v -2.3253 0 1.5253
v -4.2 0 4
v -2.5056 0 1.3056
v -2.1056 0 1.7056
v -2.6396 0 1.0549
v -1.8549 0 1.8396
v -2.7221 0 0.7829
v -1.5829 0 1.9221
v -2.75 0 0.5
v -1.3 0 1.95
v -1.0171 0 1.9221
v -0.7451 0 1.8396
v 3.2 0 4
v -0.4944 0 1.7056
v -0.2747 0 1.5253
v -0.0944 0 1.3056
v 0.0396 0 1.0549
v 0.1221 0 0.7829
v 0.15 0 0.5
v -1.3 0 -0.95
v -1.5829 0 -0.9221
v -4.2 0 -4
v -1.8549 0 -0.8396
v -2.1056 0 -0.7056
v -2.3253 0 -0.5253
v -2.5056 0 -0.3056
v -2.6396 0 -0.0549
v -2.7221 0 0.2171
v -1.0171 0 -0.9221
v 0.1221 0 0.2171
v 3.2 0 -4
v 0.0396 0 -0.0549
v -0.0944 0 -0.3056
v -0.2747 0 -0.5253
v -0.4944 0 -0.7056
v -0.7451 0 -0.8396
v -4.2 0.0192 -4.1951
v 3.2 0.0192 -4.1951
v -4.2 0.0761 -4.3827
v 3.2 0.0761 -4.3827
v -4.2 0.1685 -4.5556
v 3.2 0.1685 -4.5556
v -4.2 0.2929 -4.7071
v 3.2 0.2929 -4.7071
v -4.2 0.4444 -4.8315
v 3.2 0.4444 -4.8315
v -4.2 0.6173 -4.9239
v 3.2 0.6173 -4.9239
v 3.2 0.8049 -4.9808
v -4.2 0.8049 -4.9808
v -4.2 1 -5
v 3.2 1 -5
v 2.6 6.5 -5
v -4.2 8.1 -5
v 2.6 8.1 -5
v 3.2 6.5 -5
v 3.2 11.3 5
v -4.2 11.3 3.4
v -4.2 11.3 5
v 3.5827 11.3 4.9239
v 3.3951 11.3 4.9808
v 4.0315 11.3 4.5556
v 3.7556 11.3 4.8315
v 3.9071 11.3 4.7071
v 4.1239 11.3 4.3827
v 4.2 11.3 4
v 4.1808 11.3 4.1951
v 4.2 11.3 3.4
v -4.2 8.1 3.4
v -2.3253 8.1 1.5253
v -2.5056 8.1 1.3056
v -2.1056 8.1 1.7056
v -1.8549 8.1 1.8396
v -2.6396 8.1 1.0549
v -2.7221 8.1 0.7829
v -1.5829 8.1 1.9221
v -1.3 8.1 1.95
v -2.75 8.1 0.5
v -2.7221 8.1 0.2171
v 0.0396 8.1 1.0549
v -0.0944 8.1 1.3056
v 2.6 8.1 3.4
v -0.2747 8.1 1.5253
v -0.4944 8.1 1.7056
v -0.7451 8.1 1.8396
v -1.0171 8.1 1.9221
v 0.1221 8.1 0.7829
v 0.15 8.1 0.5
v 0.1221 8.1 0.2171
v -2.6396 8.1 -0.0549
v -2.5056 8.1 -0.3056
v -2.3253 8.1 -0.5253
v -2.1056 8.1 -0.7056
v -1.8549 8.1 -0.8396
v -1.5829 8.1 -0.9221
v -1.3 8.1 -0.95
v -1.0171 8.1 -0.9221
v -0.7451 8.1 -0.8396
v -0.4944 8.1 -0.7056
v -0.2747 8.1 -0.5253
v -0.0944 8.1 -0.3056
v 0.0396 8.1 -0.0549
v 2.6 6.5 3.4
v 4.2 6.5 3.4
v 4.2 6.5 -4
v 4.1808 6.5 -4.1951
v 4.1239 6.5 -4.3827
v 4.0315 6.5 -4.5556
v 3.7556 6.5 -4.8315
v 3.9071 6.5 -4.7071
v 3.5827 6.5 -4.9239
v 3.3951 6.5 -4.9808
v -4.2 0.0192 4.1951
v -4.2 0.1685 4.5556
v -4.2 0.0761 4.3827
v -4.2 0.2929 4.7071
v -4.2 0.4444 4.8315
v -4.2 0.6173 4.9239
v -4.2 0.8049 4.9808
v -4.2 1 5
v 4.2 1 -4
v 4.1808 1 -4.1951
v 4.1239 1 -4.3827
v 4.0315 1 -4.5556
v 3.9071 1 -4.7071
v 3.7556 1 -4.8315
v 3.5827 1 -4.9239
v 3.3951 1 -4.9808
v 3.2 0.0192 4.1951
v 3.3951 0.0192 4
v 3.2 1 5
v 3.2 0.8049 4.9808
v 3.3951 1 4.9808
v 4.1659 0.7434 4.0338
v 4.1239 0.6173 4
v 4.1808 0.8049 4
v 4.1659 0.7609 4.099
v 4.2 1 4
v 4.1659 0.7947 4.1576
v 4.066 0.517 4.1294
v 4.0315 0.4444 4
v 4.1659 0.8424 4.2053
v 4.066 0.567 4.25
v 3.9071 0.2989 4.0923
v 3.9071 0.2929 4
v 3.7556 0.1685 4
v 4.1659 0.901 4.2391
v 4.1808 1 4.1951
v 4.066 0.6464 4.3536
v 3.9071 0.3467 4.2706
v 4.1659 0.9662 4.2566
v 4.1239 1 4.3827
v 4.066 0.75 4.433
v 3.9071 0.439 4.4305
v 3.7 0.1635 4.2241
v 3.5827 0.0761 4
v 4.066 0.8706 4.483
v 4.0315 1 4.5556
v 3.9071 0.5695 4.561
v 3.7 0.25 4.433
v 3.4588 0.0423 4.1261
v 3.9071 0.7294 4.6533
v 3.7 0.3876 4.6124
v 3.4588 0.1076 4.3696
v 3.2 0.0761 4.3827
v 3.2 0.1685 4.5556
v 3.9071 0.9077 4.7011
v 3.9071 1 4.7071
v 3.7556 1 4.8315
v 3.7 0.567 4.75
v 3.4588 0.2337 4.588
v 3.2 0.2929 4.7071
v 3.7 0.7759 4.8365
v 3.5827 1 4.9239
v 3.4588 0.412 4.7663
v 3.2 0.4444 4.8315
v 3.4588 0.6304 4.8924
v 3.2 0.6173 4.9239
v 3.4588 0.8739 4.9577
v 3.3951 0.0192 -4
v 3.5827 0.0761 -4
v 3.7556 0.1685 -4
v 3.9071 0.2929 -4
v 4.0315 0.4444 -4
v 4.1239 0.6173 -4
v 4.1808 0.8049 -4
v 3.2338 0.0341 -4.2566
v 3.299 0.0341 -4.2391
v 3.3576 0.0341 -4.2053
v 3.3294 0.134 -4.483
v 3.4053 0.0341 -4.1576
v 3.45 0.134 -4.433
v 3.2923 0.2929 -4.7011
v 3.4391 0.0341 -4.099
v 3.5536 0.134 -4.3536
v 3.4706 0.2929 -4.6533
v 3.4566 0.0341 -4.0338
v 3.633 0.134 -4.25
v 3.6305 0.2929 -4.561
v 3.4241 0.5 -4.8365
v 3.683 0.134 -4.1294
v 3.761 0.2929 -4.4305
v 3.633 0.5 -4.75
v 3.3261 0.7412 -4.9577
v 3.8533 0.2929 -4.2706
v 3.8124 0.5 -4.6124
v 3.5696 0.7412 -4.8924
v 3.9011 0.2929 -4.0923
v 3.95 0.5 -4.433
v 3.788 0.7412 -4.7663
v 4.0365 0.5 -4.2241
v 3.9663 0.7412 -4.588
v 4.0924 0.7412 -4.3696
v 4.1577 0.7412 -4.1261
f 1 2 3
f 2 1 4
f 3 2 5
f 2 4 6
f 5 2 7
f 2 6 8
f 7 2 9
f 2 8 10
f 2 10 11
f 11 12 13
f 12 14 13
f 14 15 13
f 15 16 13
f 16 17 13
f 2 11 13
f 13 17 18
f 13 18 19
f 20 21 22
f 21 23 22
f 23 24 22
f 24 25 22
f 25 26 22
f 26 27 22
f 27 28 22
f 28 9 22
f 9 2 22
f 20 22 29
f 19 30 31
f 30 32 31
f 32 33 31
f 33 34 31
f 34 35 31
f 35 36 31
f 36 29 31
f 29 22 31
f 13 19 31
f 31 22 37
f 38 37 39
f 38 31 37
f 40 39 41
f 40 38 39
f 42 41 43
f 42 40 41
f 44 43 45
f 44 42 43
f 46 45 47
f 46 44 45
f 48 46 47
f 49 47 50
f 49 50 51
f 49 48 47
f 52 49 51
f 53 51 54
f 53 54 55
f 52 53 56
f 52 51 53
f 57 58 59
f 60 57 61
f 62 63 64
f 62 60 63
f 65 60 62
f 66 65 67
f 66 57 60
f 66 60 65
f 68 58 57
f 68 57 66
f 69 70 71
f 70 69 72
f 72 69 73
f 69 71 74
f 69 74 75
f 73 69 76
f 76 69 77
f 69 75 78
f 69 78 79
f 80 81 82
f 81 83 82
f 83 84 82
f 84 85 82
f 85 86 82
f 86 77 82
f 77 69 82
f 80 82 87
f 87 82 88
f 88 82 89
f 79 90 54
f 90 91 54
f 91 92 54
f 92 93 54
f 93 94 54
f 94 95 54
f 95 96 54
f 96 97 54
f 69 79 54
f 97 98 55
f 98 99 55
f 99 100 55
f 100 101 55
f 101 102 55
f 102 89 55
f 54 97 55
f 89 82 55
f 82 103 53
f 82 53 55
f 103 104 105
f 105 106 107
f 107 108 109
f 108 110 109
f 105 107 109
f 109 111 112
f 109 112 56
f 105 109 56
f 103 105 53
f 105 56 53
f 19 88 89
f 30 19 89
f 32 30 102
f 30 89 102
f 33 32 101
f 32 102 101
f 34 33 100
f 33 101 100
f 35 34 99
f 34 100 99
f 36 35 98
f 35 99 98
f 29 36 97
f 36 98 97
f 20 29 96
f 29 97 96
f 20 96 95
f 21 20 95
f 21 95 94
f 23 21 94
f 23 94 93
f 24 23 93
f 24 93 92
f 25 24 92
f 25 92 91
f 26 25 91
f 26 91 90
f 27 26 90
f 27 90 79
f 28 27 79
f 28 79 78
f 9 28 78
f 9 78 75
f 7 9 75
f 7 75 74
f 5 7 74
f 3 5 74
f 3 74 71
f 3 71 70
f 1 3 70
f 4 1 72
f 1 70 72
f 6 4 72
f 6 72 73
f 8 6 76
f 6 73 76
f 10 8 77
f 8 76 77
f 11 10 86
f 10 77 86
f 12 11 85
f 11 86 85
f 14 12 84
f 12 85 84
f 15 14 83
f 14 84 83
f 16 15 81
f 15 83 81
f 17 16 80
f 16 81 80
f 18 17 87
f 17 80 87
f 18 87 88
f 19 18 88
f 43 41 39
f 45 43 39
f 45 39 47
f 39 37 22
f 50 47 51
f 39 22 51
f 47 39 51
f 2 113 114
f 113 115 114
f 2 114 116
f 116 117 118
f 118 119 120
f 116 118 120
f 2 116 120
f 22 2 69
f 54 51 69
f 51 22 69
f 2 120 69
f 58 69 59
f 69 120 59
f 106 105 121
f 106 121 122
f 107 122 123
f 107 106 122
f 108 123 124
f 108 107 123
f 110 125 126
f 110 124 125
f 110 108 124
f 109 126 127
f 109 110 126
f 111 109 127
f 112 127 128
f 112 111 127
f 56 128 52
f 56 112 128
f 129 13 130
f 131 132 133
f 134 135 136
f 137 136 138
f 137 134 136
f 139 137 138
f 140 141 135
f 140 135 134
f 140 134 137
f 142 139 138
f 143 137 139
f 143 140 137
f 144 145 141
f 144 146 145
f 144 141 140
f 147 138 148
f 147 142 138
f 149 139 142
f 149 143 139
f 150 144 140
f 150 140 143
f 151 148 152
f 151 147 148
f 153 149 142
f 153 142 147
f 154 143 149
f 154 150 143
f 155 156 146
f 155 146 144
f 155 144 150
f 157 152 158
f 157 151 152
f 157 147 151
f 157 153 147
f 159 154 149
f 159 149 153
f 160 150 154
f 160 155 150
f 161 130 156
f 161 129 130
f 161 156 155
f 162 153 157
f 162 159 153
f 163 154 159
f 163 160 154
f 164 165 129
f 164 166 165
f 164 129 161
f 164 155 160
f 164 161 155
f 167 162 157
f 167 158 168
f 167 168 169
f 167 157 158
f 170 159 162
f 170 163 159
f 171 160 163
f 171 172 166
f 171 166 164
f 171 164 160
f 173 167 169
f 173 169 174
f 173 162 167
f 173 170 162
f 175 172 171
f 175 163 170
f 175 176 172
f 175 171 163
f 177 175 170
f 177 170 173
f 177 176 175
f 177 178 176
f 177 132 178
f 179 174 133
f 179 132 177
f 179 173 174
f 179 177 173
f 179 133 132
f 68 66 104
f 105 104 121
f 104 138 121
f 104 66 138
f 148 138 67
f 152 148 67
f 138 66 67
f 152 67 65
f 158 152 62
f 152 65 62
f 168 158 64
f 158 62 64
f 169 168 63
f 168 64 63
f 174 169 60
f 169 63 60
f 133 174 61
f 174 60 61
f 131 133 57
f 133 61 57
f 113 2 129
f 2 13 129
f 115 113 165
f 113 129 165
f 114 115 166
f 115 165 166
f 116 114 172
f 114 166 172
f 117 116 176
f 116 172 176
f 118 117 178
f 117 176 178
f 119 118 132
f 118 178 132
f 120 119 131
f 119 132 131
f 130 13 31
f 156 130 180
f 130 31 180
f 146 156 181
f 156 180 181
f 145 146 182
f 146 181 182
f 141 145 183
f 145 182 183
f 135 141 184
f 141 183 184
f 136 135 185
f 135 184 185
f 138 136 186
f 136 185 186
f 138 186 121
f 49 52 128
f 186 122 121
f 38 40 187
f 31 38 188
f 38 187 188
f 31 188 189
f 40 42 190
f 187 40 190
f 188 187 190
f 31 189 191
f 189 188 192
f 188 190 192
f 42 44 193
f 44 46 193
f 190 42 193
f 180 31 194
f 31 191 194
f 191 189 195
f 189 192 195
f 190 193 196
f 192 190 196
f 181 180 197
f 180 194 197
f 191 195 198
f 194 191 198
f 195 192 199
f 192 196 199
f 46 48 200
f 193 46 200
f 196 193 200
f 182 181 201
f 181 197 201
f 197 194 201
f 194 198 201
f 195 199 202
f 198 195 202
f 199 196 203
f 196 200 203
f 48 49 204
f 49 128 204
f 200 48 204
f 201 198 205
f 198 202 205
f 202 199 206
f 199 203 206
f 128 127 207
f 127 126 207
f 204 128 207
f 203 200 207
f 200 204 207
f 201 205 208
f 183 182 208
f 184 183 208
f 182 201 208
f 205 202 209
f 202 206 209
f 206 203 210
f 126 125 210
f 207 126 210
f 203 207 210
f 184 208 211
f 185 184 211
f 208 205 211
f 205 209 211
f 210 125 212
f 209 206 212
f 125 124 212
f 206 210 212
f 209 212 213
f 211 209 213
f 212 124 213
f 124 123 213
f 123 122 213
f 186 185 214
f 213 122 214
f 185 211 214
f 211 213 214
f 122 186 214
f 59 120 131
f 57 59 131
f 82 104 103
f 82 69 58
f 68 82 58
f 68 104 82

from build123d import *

# Parameters (mm, degrees)
SKETCH2_W               = 8.4
SKETCH2_H               = 10
BOSS_EXTRUDE1_DEPTH     = 11.3
SKETCH5_W               = 8.4
SKETCH5_H               = 1.5
CUT_EXTRUDE2_DEPTH      = 11.3
SKETCH7_W               = 1.6
SKETCH7_H               = 3.3
CUT_EXTRUDE4_DEPTH      = 8.4
SKETCH9_W               = 8.4
SKETCH9_H               = 1.7
CUT_EXTRUDE5_DEPTH      = 6.8
SKETCH12_W              = 6.8
SKETCH12_H              = 1.6
BOSS_EXTRUDE3_DEPTH     = 1.6
FILLET1_R               = 1
M3_5X0_6_TAPPED_HOLE1_D = 2.9
SKETCH20_W              = 1.6
SKETCH20_H              = 1.6
CUT_EXTRUDE6_DEPTH      = 6.8


with BuildPart() as part:
    # Sketch2 → Boss-Extrude1 (new body)
    with BuildSketch(Plane(origin=(0, 0, 0), x_dir=(1, 0, 0), z_dir=(0, 1, 0))):
        Rectangle(SKETCH2_W, SKETCH2_H)
    extrude(amount=BOSS_EXTRUDE1_DEPTH)

    # Sketch5 → Cut-Extrude2 (cut)
    with BuildSketch(Plane(origin=(4.2, 0, 0), x_dir=(0, 0, -1), z_dir=(1, 0, 0))):
        with Locations((0.8, 10.55)):
            Rectangle(SKETCH5_W, SKETCH5_H)
    extrude(amount=-CUT_EXTRUDE2_DEPTH, mode=Mode.SUBTRACT)

    # Sketch7 → Cut-Extrude4 (cut)
    with BuildSketch(Plane(origin=(0, 0, -5), x_dir=(-1, 0, 0), z_dir=(0, 0, -1))):
        with Locations((-3.4, 8.15)):
            Rectangle(SKETCH7_W, SKETCH7_H)
    extrude(amount=-CUT_EXTRUDE4_DEPTH, mode=Mode.SUBTRACT)

    # Sketch9 → Cut-Extrude5 (cut)
    with BuildSketch(Plane(origin=(2.6, 0, 0), x_dir=(0, 0, -1), z_dir=(1, 0, 0))):
        with Locations((0.8, 8.95)):
            Rectangle(SKETCH9_W, SKETCH9_H)
    extrude(amount=-CUT_EXTRUDE5_DEPTH, mode=Mode.SUBTRACT)

    # Sketch12 → Boss-Extrude3 (add)
    with BuildSketch(Plane(origin=(0, 0, 3.4), x_dir=(-1, 0, 0), z_dir=(0, 0, -1))):
        with Locations((0.8, 8.9)):
            Rectangle(SKETCH12_W, SKETCH12_H)
    extrude(amount=BOSS_EXTRUDE3_DEPTH)

    # Fillet1
    fillet1_edges = [part.edges().sort_by_distance(p)[0] for p in [
        (4.2, 3.25, -5),
        (0, 0, 5),
        (0, 0, -5),
        (4.2, 0, 0),
        (4.2, 5.65, 5),
    ]]
    fillet(fillet1_edges, radius=FILLET1_R)

    # M3.5x0.6 Tapped Hole1 (through all)
    with Locations(Plane(origin=(0, 0, 0), x_dir=(-1, 0, 0), z_dir=(0, -1, 0))):
        with Locations((1.3, -0.5)):
            Hole(M3_5X0_6_TAPPED_HOLE1_D / 2)

    # Sketch20 → Cut-Extrude6 (cut)
    with BuildSketch(Plane(origin=(2.6, 0, 0), x_dir=(0, 0, -1), z_dir=(1, 0, 0))):
        with Locations((-2.6, 8.9)):
            Rectangle(SKETCH20_W, SKETCH20_H)
    extrude(amount=-CUT_EXTRUDE6_DEPTH, mode=Mode.SUBTRACT)


solid = part.part
